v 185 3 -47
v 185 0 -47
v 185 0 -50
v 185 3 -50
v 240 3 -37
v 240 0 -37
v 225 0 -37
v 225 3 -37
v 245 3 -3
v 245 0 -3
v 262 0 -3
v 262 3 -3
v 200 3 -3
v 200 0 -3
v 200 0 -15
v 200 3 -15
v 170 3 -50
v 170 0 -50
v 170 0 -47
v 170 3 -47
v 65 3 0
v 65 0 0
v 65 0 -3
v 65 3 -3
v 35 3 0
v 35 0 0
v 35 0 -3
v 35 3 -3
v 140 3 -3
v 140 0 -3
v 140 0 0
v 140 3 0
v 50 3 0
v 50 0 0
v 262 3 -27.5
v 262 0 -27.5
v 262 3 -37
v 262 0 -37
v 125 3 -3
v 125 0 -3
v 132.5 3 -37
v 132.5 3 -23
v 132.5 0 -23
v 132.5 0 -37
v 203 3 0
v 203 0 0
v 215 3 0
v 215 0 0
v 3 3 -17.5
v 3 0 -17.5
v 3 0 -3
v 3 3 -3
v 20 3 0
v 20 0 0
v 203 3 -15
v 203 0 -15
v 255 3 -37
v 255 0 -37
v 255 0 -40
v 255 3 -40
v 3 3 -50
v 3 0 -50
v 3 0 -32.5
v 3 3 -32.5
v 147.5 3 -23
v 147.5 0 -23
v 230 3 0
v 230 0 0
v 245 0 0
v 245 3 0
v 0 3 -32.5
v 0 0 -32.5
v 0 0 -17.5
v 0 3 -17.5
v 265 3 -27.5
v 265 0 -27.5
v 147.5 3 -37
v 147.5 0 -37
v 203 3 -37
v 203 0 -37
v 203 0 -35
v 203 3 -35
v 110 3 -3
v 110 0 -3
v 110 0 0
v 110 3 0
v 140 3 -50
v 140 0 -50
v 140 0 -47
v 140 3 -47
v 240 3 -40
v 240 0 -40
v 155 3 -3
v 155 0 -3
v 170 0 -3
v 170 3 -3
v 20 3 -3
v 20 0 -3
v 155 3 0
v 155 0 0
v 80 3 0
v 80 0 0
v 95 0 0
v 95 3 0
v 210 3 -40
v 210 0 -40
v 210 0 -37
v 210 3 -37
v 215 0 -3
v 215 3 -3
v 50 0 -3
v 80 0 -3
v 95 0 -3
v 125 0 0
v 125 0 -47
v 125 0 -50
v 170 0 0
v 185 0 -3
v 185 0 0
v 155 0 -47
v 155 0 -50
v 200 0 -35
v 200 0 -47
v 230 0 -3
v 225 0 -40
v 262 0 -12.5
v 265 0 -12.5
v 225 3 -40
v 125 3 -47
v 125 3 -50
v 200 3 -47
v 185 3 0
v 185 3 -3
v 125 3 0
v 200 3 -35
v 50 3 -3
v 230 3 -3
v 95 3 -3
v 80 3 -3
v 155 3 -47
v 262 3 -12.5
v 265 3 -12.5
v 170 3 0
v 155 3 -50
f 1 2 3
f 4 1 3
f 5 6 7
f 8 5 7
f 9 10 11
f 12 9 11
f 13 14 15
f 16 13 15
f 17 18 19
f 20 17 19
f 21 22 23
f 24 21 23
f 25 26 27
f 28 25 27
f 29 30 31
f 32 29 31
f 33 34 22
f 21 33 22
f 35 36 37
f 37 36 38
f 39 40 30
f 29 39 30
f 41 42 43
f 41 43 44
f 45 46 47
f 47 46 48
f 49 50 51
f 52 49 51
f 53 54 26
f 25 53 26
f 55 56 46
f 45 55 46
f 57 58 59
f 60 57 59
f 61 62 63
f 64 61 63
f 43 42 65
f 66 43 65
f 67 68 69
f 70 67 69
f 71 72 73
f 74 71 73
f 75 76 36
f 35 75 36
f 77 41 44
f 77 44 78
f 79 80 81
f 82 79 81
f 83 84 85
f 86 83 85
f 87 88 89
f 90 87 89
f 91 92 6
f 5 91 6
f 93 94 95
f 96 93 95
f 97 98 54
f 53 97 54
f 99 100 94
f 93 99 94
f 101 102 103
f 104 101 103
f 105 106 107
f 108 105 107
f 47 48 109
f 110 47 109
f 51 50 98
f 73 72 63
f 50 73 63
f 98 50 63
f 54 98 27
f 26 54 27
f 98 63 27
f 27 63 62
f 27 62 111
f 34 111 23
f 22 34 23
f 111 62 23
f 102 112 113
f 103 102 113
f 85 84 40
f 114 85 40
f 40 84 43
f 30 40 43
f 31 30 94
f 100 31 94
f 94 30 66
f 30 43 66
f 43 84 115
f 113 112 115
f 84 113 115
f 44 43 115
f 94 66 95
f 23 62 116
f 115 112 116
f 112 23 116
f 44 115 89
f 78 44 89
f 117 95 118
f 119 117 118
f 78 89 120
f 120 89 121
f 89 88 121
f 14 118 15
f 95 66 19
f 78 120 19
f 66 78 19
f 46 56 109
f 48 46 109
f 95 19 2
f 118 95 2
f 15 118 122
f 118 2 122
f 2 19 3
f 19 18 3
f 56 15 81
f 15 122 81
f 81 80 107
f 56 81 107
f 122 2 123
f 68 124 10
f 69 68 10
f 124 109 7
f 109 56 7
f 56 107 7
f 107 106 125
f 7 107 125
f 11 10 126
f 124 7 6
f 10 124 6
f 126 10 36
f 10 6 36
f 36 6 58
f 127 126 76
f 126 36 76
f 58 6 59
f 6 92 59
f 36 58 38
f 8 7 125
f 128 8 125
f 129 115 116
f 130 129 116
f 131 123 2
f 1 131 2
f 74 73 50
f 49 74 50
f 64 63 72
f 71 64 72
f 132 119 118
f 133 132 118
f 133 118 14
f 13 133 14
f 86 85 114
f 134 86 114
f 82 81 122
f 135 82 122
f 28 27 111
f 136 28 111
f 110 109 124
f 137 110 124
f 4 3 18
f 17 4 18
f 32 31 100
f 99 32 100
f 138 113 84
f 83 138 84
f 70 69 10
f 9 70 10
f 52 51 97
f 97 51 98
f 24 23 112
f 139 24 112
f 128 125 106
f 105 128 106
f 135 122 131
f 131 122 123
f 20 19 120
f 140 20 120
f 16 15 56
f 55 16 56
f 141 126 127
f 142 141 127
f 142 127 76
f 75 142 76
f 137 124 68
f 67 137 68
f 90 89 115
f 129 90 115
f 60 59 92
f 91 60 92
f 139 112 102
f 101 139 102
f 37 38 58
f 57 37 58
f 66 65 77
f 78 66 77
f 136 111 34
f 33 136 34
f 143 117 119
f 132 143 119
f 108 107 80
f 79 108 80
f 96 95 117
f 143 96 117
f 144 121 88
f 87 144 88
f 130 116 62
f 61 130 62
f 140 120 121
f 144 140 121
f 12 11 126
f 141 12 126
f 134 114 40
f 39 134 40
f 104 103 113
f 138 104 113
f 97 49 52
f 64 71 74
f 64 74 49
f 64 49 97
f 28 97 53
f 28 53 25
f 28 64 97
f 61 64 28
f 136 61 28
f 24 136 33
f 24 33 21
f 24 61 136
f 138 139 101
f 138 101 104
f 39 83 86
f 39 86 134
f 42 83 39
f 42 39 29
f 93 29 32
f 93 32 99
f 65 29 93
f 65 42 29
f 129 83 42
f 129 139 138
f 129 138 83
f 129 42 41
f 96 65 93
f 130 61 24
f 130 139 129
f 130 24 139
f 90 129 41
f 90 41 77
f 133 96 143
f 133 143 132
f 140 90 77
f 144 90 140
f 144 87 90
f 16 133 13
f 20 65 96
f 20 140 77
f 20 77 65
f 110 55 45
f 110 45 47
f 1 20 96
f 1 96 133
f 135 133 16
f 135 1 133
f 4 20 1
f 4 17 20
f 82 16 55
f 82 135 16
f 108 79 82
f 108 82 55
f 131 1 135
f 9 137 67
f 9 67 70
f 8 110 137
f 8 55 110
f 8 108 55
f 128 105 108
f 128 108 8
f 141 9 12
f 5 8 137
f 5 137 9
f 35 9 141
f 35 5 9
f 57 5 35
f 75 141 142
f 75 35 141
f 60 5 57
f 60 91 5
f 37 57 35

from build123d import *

# Parameters (mm, degrees)
SALIENTE_EXTRUIR1_DEPTH = 3
SKETCH1_W               = 15
SKETCH1_H               = 14
CUT_EXTRUDE1_DEPTH      = 10


with BuildPart() as part:
    # Croquis1 → Saliente-Extruir1 (new body)
    with BuildSketch(Plane(origin=(0, 0, 0), x_dir=(1, 0, 0), z_dir=(0, 1, 0))):
        Polygon((125, 47), (125, 50), (3, 50), (3, 32.5), (0, 32.5), (0, 17.5), (3, 17.5), (3, 3), (20, 3), (20, 0), (35, 0), (35, 3), (50, 3), (50, 0), (65, 0), (65, 3), (80, 3), (80, 0), (95, 0), (95, 3), (110, 3), (110, 0), (125, 0), (125, 3), (140, 3), (140, 0), (155, 0), (155, 3), (170, 3), (170, 0), (185, 0), (185, 3), (200, 3), (200, 15), (203, 15), (203, 0), (215, 0), (215, 3), (230, 3), (230, 0), (245, 0), (245, 3), (262, 3), (262, 12.5), (265, 12.5), (265, 27.5), (262, 27.5), (262, 37), (255, 37), (255, 40), (240, 40), (240, 37), (225, 37), (225, 40), (210, 40), (210, 37), (203, 37), (203, 35), (200, 35), (200, 47), (185, 47), (185, 50), (170, 50), (170, 47), (155, 47), (155, 50), (140, 50), (140, 47), align=None)
    extrude(amount=SALIENTE_EXTRUIR1_DEPTH)

    # Sketch1 → Cut-Extrude1 (cut)
    with BuildSketch(Plane(origin=(0, 3, 0), x_dir=(1, 0, 0), z_dir=(0, 1, 0))):
        with Locations((140, 30)):
            Rectangle(SKETCH1_W, SKETCH1_H)
    extrude(amount=-CUT_EXTRUDE1_DEPTH, mode=Mode.SUBTRACT)


solid = part.part
